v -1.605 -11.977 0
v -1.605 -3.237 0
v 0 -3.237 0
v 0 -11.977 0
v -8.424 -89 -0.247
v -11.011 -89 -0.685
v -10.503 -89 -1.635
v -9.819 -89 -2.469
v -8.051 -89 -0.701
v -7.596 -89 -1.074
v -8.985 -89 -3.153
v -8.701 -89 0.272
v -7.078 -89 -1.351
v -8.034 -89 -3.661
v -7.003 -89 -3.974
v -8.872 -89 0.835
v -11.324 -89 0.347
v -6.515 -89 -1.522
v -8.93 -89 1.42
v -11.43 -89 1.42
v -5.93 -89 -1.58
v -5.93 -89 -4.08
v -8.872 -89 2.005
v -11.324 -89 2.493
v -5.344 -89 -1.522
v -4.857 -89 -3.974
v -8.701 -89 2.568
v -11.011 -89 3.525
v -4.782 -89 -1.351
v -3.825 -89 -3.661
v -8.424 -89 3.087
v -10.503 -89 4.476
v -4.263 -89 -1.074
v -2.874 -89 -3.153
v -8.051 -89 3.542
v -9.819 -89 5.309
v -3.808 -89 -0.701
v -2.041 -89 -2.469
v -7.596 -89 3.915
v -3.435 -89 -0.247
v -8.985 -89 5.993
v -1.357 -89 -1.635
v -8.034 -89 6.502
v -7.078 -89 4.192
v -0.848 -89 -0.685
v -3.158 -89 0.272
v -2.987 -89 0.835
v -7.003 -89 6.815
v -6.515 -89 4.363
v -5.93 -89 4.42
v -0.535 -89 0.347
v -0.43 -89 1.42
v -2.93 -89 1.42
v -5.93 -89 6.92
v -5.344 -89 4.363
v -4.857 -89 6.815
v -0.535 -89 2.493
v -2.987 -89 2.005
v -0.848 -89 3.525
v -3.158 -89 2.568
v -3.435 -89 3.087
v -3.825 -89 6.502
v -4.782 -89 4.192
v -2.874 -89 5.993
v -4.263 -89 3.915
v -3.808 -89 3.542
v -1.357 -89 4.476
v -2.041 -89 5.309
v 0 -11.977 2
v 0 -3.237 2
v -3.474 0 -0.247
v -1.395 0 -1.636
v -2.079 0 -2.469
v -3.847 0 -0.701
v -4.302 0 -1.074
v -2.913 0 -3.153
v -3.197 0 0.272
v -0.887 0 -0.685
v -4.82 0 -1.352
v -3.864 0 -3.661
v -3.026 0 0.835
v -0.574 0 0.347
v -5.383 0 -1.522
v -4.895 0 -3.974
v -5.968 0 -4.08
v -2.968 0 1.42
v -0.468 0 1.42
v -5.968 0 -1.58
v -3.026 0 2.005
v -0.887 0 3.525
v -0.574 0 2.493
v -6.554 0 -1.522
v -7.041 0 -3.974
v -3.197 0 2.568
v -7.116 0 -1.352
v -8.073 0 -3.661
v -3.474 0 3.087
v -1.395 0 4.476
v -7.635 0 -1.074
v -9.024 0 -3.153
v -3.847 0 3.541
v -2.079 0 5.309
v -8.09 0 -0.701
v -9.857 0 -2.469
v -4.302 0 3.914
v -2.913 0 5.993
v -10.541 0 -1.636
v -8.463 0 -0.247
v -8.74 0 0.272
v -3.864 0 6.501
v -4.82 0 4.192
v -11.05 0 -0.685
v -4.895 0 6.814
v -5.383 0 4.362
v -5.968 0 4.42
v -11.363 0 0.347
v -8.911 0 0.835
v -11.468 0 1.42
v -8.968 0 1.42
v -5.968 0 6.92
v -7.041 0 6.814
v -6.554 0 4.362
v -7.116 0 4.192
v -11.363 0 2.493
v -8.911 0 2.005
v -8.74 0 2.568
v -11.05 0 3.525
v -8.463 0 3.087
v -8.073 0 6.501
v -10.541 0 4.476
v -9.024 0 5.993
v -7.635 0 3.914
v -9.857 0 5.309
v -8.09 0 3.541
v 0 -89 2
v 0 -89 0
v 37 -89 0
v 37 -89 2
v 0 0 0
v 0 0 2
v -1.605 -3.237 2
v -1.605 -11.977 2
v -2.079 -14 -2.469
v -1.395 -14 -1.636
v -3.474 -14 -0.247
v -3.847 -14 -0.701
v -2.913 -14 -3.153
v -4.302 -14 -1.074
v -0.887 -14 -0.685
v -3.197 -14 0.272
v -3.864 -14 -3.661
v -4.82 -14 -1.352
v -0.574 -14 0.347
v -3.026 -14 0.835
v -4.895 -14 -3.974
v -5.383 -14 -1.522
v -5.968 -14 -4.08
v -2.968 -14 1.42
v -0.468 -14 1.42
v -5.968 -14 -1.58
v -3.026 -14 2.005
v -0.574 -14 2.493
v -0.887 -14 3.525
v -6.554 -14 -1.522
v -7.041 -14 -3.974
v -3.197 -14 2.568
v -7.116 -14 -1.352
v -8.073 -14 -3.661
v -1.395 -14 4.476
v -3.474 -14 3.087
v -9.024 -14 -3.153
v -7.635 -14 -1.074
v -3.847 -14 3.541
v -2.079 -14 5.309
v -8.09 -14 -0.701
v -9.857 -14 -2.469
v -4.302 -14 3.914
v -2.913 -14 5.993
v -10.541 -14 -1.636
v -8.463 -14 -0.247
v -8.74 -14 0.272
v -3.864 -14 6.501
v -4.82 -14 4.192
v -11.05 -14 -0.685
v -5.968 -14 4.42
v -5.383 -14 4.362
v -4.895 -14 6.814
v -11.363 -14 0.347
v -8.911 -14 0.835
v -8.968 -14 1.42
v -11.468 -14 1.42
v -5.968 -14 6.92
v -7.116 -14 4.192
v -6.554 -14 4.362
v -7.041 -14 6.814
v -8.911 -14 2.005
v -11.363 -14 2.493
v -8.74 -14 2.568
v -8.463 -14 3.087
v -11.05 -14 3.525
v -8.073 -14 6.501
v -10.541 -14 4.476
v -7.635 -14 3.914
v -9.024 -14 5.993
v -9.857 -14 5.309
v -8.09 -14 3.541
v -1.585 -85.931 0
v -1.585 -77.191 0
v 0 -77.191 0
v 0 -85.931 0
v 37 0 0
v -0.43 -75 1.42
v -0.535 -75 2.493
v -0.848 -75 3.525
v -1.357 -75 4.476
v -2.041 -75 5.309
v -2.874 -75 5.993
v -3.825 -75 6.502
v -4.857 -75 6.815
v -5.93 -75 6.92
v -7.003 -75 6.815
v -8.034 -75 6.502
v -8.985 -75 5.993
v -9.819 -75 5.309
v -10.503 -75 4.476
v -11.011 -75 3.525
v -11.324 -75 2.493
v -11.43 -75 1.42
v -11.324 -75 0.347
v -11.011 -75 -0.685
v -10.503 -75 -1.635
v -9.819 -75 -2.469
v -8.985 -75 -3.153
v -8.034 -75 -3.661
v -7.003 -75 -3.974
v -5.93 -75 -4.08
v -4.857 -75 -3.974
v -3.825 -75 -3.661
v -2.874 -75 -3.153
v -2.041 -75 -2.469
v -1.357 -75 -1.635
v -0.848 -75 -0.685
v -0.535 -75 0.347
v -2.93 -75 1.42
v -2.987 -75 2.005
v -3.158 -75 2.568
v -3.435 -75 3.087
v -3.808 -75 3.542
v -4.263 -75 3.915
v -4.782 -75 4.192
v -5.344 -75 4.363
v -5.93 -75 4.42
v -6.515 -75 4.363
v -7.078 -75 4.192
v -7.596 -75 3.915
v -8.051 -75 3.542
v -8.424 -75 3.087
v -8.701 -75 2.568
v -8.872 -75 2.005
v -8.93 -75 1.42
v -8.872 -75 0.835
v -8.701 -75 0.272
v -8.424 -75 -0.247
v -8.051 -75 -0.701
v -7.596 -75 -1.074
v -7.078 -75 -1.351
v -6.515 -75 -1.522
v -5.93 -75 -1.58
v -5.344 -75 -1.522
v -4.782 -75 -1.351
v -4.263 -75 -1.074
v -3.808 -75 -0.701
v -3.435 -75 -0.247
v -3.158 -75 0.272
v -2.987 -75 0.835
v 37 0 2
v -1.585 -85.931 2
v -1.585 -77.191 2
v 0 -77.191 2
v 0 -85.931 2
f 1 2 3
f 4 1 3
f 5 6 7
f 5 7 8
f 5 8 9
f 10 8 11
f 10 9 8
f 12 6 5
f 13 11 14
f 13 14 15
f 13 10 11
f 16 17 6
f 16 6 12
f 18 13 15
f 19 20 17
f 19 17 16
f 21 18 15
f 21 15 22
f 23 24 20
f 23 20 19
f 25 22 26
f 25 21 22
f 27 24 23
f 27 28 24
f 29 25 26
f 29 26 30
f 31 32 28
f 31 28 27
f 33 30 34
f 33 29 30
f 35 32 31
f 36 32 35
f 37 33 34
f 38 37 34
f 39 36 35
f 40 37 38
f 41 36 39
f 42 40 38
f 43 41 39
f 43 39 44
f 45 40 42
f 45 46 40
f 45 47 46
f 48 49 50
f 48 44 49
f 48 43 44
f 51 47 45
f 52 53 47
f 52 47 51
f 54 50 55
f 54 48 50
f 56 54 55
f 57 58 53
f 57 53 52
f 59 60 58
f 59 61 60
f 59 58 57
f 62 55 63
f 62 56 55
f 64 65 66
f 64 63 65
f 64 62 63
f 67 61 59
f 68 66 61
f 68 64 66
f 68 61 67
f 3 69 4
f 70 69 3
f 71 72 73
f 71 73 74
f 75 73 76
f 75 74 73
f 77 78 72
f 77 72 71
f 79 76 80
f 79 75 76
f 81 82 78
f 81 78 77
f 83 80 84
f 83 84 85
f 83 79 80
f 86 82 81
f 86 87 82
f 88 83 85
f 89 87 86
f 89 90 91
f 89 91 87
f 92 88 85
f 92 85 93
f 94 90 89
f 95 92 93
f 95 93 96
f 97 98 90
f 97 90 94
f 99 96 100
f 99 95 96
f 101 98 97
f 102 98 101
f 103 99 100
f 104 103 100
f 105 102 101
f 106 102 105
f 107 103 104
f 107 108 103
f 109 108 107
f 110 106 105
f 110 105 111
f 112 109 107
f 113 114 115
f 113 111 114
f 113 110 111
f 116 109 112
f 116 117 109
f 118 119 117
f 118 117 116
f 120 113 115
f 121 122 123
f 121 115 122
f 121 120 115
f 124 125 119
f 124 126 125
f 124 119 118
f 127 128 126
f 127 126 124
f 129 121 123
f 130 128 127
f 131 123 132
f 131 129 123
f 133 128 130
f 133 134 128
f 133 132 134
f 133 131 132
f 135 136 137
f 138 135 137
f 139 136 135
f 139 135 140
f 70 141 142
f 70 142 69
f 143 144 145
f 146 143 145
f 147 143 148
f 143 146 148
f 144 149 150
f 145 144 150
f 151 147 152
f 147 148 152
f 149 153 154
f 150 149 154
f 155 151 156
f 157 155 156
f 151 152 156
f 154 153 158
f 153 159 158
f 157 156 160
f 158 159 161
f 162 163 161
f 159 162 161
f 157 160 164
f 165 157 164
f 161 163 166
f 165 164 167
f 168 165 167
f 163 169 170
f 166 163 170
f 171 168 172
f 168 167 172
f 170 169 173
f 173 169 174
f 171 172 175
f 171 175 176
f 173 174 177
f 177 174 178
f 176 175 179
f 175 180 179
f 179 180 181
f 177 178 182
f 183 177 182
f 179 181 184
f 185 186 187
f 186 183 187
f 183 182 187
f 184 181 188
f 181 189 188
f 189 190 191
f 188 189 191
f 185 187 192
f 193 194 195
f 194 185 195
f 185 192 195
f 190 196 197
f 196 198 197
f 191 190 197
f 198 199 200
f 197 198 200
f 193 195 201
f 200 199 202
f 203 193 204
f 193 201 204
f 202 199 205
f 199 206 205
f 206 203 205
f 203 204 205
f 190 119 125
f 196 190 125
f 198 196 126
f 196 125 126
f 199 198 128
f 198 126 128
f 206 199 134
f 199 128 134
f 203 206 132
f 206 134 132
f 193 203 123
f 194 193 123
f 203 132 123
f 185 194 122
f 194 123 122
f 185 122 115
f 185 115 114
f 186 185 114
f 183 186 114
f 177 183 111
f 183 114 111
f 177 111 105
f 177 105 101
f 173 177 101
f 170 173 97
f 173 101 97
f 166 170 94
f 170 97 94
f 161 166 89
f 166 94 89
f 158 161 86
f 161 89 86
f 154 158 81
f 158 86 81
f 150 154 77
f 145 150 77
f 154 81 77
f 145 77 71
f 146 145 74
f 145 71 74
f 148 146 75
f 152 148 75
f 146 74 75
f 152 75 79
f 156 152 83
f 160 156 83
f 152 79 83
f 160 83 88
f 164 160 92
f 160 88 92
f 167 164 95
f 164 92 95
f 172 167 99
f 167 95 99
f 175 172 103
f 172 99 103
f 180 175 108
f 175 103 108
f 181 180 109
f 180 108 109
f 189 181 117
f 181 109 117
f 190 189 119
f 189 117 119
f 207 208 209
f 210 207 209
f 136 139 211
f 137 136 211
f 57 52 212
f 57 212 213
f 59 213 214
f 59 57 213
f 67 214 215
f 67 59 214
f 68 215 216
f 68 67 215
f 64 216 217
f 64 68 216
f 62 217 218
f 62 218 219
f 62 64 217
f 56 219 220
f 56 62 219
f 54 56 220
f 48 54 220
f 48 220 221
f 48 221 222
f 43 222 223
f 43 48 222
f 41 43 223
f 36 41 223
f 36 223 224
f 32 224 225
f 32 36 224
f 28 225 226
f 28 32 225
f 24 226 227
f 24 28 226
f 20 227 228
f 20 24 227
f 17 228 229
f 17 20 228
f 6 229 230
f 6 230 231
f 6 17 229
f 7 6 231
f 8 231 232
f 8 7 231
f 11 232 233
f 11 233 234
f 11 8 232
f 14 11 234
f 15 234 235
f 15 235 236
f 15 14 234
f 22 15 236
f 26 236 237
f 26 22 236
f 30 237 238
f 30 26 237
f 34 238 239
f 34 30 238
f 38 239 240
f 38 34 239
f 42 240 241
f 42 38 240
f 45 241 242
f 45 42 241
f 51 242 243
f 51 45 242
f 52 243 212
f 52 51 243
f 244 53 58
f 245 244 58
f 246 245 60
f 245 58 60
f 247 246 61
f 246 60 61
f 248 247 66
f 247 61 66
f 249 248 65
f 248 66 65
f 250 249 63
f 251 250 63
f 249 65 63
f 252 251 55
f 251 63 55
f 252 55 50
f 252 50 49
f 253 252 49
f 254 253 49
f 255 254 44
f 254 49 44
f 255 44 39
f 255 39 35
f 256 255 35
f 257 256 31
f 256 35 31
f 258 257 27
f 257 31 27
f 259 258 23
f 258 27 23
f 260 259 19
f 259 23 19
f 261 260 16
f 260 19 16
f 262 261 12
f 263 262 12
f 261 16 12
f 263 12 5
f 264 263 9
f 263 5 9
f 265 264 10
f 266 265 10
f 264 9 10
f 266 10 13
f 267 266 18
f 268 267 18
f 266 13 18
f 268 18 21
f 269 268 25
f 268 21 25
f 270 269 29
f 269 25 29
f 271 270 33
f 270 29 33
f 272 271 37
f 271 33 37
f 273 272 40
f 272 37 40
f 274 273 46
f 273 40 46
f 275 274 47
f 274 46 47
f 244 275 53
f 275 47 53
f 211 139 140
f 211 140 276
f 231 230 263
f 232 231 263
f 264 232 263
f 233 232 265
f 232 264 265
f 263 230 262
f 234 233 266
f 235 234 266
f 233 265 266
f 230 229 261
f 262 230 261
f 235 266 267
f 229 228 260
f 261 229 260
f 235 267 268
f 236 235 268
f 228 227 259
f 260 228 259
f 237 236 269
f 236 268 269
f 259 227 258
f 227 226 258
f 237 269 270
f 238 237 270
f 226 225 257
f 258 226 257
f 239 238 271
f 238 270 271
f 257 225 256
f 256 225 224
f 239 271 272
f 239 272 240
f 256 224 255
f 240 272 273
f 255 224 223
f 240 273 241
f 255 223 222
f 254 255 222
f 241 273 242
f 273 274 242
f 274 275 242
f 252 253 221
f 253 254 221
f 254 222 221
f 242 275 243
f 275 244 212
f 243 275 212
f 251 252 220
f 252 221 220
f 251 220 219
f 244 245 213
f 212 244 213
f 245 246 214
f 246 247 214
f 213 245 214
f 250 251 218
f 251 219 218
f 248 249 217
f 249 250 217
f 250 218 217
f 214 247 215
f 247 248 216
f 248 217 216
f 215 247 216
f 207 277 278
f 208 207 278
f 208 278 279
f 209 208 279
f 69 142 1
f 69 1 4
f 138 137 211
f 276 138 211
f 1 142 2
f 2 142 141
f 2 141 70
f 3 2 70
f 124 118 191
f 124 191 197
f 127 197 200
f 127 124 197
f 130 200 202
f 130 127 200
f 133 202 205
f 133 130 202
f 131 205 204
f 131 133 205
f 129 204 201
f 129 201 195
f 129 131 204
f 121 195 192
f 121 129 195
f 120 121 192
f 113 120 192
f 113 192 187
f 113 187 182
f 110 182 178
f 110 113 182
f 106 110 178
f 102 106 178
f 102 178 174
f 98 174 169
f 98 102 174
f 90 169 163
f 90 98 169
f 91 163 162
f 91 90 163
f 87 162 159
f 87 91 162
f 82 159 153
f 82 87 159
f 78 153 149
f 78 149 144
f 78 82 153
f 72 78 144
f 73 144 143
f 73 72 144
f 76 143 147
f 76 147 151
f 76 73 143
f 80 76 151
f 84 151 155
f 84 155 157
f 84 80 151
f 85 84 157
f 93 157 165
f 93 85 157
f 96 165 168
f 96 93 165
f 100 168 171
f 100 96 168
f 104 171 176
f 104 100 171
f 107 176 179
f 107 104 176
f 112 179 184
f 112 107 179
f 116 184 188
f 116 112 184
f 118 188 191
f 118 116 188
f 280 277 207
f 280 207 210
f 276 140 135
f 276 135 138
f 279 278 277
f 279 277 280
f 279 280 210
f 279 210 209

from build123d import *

# Parameters (mm, degrees)
F0_W     = 37
F0_H     = 89
F1_DEPTH = 2
F2_R     = 5.5
F2_R_2   = 3
F3_DEPTH = 14
F4_W     = 1.585274
F4_H     = 8.739933
F5_DEPTH = 2
F6_R     = 5.5
F6_R_2   = 3
F7_DEPTH = 14
F8_W     = 1.604593
F8_H     = 8.73993
F9_DEPTH = 2


with BuildPart() as f1:
    # F0 (on Top) → F1 (new body)
    with BuildSketch(Plane.XY):
        with Locations((18.5, -44.5)):
            Rectangle(F0_W, F0_H)
    extrude(amount=F1_DEPTH)


with BuildPart() as f3:
    # F2 (on face) → F3 (new body)
    with BuildSketch(Plane.XZ.offset(89)):
        with Locations((-5.929632, 1.420189)):
            Circle(F2_R)
        with Locations((-5.929632, 1.420189)):
            Circle(F2_R_2, mode=Mode.SUBTRACT)
    extrude(amount=-F3_DEPTH)


with BuildPart() as f5:
    # F4 (on face) → F5 (new body)
    with BuildSketch(Plane.XY.offset(2)):
        with Locations((-0.792637, -81.560656)):
            Rectangle(F4_W, F4_H)
    extrude(amount=-F5_DEPTH)


with BuildPart() as f7:
    # F6 (on face) → F7 (new body)
    with BuildSketch(Plane(origin=(0, 0, 0), x_dir=(-1, 0, 0), z_dir=(0, 1, 0))):
        with Locations((5.968269, 1.42)):
            Circle(F6_R)
        with Locations((5.968269, 1.42)):
            Circle(F6_R_2, mode=Mode.SUBTRACT)
    extrude(amount=-F7_DEPTH)


with BuildPart() as f9:
    # F8 (on face) → F9 (new body)
    with BuildSketch(Plane.XY.offset(2)):
        with Locations((-0.802296, -7.607417)):
            Rectangle(F8_W, F8_H)
    extrude(amount=-F9_DEPTH)


solid = Compound([f1.part, f3.part, f5.part, f7.part, f9.part])
